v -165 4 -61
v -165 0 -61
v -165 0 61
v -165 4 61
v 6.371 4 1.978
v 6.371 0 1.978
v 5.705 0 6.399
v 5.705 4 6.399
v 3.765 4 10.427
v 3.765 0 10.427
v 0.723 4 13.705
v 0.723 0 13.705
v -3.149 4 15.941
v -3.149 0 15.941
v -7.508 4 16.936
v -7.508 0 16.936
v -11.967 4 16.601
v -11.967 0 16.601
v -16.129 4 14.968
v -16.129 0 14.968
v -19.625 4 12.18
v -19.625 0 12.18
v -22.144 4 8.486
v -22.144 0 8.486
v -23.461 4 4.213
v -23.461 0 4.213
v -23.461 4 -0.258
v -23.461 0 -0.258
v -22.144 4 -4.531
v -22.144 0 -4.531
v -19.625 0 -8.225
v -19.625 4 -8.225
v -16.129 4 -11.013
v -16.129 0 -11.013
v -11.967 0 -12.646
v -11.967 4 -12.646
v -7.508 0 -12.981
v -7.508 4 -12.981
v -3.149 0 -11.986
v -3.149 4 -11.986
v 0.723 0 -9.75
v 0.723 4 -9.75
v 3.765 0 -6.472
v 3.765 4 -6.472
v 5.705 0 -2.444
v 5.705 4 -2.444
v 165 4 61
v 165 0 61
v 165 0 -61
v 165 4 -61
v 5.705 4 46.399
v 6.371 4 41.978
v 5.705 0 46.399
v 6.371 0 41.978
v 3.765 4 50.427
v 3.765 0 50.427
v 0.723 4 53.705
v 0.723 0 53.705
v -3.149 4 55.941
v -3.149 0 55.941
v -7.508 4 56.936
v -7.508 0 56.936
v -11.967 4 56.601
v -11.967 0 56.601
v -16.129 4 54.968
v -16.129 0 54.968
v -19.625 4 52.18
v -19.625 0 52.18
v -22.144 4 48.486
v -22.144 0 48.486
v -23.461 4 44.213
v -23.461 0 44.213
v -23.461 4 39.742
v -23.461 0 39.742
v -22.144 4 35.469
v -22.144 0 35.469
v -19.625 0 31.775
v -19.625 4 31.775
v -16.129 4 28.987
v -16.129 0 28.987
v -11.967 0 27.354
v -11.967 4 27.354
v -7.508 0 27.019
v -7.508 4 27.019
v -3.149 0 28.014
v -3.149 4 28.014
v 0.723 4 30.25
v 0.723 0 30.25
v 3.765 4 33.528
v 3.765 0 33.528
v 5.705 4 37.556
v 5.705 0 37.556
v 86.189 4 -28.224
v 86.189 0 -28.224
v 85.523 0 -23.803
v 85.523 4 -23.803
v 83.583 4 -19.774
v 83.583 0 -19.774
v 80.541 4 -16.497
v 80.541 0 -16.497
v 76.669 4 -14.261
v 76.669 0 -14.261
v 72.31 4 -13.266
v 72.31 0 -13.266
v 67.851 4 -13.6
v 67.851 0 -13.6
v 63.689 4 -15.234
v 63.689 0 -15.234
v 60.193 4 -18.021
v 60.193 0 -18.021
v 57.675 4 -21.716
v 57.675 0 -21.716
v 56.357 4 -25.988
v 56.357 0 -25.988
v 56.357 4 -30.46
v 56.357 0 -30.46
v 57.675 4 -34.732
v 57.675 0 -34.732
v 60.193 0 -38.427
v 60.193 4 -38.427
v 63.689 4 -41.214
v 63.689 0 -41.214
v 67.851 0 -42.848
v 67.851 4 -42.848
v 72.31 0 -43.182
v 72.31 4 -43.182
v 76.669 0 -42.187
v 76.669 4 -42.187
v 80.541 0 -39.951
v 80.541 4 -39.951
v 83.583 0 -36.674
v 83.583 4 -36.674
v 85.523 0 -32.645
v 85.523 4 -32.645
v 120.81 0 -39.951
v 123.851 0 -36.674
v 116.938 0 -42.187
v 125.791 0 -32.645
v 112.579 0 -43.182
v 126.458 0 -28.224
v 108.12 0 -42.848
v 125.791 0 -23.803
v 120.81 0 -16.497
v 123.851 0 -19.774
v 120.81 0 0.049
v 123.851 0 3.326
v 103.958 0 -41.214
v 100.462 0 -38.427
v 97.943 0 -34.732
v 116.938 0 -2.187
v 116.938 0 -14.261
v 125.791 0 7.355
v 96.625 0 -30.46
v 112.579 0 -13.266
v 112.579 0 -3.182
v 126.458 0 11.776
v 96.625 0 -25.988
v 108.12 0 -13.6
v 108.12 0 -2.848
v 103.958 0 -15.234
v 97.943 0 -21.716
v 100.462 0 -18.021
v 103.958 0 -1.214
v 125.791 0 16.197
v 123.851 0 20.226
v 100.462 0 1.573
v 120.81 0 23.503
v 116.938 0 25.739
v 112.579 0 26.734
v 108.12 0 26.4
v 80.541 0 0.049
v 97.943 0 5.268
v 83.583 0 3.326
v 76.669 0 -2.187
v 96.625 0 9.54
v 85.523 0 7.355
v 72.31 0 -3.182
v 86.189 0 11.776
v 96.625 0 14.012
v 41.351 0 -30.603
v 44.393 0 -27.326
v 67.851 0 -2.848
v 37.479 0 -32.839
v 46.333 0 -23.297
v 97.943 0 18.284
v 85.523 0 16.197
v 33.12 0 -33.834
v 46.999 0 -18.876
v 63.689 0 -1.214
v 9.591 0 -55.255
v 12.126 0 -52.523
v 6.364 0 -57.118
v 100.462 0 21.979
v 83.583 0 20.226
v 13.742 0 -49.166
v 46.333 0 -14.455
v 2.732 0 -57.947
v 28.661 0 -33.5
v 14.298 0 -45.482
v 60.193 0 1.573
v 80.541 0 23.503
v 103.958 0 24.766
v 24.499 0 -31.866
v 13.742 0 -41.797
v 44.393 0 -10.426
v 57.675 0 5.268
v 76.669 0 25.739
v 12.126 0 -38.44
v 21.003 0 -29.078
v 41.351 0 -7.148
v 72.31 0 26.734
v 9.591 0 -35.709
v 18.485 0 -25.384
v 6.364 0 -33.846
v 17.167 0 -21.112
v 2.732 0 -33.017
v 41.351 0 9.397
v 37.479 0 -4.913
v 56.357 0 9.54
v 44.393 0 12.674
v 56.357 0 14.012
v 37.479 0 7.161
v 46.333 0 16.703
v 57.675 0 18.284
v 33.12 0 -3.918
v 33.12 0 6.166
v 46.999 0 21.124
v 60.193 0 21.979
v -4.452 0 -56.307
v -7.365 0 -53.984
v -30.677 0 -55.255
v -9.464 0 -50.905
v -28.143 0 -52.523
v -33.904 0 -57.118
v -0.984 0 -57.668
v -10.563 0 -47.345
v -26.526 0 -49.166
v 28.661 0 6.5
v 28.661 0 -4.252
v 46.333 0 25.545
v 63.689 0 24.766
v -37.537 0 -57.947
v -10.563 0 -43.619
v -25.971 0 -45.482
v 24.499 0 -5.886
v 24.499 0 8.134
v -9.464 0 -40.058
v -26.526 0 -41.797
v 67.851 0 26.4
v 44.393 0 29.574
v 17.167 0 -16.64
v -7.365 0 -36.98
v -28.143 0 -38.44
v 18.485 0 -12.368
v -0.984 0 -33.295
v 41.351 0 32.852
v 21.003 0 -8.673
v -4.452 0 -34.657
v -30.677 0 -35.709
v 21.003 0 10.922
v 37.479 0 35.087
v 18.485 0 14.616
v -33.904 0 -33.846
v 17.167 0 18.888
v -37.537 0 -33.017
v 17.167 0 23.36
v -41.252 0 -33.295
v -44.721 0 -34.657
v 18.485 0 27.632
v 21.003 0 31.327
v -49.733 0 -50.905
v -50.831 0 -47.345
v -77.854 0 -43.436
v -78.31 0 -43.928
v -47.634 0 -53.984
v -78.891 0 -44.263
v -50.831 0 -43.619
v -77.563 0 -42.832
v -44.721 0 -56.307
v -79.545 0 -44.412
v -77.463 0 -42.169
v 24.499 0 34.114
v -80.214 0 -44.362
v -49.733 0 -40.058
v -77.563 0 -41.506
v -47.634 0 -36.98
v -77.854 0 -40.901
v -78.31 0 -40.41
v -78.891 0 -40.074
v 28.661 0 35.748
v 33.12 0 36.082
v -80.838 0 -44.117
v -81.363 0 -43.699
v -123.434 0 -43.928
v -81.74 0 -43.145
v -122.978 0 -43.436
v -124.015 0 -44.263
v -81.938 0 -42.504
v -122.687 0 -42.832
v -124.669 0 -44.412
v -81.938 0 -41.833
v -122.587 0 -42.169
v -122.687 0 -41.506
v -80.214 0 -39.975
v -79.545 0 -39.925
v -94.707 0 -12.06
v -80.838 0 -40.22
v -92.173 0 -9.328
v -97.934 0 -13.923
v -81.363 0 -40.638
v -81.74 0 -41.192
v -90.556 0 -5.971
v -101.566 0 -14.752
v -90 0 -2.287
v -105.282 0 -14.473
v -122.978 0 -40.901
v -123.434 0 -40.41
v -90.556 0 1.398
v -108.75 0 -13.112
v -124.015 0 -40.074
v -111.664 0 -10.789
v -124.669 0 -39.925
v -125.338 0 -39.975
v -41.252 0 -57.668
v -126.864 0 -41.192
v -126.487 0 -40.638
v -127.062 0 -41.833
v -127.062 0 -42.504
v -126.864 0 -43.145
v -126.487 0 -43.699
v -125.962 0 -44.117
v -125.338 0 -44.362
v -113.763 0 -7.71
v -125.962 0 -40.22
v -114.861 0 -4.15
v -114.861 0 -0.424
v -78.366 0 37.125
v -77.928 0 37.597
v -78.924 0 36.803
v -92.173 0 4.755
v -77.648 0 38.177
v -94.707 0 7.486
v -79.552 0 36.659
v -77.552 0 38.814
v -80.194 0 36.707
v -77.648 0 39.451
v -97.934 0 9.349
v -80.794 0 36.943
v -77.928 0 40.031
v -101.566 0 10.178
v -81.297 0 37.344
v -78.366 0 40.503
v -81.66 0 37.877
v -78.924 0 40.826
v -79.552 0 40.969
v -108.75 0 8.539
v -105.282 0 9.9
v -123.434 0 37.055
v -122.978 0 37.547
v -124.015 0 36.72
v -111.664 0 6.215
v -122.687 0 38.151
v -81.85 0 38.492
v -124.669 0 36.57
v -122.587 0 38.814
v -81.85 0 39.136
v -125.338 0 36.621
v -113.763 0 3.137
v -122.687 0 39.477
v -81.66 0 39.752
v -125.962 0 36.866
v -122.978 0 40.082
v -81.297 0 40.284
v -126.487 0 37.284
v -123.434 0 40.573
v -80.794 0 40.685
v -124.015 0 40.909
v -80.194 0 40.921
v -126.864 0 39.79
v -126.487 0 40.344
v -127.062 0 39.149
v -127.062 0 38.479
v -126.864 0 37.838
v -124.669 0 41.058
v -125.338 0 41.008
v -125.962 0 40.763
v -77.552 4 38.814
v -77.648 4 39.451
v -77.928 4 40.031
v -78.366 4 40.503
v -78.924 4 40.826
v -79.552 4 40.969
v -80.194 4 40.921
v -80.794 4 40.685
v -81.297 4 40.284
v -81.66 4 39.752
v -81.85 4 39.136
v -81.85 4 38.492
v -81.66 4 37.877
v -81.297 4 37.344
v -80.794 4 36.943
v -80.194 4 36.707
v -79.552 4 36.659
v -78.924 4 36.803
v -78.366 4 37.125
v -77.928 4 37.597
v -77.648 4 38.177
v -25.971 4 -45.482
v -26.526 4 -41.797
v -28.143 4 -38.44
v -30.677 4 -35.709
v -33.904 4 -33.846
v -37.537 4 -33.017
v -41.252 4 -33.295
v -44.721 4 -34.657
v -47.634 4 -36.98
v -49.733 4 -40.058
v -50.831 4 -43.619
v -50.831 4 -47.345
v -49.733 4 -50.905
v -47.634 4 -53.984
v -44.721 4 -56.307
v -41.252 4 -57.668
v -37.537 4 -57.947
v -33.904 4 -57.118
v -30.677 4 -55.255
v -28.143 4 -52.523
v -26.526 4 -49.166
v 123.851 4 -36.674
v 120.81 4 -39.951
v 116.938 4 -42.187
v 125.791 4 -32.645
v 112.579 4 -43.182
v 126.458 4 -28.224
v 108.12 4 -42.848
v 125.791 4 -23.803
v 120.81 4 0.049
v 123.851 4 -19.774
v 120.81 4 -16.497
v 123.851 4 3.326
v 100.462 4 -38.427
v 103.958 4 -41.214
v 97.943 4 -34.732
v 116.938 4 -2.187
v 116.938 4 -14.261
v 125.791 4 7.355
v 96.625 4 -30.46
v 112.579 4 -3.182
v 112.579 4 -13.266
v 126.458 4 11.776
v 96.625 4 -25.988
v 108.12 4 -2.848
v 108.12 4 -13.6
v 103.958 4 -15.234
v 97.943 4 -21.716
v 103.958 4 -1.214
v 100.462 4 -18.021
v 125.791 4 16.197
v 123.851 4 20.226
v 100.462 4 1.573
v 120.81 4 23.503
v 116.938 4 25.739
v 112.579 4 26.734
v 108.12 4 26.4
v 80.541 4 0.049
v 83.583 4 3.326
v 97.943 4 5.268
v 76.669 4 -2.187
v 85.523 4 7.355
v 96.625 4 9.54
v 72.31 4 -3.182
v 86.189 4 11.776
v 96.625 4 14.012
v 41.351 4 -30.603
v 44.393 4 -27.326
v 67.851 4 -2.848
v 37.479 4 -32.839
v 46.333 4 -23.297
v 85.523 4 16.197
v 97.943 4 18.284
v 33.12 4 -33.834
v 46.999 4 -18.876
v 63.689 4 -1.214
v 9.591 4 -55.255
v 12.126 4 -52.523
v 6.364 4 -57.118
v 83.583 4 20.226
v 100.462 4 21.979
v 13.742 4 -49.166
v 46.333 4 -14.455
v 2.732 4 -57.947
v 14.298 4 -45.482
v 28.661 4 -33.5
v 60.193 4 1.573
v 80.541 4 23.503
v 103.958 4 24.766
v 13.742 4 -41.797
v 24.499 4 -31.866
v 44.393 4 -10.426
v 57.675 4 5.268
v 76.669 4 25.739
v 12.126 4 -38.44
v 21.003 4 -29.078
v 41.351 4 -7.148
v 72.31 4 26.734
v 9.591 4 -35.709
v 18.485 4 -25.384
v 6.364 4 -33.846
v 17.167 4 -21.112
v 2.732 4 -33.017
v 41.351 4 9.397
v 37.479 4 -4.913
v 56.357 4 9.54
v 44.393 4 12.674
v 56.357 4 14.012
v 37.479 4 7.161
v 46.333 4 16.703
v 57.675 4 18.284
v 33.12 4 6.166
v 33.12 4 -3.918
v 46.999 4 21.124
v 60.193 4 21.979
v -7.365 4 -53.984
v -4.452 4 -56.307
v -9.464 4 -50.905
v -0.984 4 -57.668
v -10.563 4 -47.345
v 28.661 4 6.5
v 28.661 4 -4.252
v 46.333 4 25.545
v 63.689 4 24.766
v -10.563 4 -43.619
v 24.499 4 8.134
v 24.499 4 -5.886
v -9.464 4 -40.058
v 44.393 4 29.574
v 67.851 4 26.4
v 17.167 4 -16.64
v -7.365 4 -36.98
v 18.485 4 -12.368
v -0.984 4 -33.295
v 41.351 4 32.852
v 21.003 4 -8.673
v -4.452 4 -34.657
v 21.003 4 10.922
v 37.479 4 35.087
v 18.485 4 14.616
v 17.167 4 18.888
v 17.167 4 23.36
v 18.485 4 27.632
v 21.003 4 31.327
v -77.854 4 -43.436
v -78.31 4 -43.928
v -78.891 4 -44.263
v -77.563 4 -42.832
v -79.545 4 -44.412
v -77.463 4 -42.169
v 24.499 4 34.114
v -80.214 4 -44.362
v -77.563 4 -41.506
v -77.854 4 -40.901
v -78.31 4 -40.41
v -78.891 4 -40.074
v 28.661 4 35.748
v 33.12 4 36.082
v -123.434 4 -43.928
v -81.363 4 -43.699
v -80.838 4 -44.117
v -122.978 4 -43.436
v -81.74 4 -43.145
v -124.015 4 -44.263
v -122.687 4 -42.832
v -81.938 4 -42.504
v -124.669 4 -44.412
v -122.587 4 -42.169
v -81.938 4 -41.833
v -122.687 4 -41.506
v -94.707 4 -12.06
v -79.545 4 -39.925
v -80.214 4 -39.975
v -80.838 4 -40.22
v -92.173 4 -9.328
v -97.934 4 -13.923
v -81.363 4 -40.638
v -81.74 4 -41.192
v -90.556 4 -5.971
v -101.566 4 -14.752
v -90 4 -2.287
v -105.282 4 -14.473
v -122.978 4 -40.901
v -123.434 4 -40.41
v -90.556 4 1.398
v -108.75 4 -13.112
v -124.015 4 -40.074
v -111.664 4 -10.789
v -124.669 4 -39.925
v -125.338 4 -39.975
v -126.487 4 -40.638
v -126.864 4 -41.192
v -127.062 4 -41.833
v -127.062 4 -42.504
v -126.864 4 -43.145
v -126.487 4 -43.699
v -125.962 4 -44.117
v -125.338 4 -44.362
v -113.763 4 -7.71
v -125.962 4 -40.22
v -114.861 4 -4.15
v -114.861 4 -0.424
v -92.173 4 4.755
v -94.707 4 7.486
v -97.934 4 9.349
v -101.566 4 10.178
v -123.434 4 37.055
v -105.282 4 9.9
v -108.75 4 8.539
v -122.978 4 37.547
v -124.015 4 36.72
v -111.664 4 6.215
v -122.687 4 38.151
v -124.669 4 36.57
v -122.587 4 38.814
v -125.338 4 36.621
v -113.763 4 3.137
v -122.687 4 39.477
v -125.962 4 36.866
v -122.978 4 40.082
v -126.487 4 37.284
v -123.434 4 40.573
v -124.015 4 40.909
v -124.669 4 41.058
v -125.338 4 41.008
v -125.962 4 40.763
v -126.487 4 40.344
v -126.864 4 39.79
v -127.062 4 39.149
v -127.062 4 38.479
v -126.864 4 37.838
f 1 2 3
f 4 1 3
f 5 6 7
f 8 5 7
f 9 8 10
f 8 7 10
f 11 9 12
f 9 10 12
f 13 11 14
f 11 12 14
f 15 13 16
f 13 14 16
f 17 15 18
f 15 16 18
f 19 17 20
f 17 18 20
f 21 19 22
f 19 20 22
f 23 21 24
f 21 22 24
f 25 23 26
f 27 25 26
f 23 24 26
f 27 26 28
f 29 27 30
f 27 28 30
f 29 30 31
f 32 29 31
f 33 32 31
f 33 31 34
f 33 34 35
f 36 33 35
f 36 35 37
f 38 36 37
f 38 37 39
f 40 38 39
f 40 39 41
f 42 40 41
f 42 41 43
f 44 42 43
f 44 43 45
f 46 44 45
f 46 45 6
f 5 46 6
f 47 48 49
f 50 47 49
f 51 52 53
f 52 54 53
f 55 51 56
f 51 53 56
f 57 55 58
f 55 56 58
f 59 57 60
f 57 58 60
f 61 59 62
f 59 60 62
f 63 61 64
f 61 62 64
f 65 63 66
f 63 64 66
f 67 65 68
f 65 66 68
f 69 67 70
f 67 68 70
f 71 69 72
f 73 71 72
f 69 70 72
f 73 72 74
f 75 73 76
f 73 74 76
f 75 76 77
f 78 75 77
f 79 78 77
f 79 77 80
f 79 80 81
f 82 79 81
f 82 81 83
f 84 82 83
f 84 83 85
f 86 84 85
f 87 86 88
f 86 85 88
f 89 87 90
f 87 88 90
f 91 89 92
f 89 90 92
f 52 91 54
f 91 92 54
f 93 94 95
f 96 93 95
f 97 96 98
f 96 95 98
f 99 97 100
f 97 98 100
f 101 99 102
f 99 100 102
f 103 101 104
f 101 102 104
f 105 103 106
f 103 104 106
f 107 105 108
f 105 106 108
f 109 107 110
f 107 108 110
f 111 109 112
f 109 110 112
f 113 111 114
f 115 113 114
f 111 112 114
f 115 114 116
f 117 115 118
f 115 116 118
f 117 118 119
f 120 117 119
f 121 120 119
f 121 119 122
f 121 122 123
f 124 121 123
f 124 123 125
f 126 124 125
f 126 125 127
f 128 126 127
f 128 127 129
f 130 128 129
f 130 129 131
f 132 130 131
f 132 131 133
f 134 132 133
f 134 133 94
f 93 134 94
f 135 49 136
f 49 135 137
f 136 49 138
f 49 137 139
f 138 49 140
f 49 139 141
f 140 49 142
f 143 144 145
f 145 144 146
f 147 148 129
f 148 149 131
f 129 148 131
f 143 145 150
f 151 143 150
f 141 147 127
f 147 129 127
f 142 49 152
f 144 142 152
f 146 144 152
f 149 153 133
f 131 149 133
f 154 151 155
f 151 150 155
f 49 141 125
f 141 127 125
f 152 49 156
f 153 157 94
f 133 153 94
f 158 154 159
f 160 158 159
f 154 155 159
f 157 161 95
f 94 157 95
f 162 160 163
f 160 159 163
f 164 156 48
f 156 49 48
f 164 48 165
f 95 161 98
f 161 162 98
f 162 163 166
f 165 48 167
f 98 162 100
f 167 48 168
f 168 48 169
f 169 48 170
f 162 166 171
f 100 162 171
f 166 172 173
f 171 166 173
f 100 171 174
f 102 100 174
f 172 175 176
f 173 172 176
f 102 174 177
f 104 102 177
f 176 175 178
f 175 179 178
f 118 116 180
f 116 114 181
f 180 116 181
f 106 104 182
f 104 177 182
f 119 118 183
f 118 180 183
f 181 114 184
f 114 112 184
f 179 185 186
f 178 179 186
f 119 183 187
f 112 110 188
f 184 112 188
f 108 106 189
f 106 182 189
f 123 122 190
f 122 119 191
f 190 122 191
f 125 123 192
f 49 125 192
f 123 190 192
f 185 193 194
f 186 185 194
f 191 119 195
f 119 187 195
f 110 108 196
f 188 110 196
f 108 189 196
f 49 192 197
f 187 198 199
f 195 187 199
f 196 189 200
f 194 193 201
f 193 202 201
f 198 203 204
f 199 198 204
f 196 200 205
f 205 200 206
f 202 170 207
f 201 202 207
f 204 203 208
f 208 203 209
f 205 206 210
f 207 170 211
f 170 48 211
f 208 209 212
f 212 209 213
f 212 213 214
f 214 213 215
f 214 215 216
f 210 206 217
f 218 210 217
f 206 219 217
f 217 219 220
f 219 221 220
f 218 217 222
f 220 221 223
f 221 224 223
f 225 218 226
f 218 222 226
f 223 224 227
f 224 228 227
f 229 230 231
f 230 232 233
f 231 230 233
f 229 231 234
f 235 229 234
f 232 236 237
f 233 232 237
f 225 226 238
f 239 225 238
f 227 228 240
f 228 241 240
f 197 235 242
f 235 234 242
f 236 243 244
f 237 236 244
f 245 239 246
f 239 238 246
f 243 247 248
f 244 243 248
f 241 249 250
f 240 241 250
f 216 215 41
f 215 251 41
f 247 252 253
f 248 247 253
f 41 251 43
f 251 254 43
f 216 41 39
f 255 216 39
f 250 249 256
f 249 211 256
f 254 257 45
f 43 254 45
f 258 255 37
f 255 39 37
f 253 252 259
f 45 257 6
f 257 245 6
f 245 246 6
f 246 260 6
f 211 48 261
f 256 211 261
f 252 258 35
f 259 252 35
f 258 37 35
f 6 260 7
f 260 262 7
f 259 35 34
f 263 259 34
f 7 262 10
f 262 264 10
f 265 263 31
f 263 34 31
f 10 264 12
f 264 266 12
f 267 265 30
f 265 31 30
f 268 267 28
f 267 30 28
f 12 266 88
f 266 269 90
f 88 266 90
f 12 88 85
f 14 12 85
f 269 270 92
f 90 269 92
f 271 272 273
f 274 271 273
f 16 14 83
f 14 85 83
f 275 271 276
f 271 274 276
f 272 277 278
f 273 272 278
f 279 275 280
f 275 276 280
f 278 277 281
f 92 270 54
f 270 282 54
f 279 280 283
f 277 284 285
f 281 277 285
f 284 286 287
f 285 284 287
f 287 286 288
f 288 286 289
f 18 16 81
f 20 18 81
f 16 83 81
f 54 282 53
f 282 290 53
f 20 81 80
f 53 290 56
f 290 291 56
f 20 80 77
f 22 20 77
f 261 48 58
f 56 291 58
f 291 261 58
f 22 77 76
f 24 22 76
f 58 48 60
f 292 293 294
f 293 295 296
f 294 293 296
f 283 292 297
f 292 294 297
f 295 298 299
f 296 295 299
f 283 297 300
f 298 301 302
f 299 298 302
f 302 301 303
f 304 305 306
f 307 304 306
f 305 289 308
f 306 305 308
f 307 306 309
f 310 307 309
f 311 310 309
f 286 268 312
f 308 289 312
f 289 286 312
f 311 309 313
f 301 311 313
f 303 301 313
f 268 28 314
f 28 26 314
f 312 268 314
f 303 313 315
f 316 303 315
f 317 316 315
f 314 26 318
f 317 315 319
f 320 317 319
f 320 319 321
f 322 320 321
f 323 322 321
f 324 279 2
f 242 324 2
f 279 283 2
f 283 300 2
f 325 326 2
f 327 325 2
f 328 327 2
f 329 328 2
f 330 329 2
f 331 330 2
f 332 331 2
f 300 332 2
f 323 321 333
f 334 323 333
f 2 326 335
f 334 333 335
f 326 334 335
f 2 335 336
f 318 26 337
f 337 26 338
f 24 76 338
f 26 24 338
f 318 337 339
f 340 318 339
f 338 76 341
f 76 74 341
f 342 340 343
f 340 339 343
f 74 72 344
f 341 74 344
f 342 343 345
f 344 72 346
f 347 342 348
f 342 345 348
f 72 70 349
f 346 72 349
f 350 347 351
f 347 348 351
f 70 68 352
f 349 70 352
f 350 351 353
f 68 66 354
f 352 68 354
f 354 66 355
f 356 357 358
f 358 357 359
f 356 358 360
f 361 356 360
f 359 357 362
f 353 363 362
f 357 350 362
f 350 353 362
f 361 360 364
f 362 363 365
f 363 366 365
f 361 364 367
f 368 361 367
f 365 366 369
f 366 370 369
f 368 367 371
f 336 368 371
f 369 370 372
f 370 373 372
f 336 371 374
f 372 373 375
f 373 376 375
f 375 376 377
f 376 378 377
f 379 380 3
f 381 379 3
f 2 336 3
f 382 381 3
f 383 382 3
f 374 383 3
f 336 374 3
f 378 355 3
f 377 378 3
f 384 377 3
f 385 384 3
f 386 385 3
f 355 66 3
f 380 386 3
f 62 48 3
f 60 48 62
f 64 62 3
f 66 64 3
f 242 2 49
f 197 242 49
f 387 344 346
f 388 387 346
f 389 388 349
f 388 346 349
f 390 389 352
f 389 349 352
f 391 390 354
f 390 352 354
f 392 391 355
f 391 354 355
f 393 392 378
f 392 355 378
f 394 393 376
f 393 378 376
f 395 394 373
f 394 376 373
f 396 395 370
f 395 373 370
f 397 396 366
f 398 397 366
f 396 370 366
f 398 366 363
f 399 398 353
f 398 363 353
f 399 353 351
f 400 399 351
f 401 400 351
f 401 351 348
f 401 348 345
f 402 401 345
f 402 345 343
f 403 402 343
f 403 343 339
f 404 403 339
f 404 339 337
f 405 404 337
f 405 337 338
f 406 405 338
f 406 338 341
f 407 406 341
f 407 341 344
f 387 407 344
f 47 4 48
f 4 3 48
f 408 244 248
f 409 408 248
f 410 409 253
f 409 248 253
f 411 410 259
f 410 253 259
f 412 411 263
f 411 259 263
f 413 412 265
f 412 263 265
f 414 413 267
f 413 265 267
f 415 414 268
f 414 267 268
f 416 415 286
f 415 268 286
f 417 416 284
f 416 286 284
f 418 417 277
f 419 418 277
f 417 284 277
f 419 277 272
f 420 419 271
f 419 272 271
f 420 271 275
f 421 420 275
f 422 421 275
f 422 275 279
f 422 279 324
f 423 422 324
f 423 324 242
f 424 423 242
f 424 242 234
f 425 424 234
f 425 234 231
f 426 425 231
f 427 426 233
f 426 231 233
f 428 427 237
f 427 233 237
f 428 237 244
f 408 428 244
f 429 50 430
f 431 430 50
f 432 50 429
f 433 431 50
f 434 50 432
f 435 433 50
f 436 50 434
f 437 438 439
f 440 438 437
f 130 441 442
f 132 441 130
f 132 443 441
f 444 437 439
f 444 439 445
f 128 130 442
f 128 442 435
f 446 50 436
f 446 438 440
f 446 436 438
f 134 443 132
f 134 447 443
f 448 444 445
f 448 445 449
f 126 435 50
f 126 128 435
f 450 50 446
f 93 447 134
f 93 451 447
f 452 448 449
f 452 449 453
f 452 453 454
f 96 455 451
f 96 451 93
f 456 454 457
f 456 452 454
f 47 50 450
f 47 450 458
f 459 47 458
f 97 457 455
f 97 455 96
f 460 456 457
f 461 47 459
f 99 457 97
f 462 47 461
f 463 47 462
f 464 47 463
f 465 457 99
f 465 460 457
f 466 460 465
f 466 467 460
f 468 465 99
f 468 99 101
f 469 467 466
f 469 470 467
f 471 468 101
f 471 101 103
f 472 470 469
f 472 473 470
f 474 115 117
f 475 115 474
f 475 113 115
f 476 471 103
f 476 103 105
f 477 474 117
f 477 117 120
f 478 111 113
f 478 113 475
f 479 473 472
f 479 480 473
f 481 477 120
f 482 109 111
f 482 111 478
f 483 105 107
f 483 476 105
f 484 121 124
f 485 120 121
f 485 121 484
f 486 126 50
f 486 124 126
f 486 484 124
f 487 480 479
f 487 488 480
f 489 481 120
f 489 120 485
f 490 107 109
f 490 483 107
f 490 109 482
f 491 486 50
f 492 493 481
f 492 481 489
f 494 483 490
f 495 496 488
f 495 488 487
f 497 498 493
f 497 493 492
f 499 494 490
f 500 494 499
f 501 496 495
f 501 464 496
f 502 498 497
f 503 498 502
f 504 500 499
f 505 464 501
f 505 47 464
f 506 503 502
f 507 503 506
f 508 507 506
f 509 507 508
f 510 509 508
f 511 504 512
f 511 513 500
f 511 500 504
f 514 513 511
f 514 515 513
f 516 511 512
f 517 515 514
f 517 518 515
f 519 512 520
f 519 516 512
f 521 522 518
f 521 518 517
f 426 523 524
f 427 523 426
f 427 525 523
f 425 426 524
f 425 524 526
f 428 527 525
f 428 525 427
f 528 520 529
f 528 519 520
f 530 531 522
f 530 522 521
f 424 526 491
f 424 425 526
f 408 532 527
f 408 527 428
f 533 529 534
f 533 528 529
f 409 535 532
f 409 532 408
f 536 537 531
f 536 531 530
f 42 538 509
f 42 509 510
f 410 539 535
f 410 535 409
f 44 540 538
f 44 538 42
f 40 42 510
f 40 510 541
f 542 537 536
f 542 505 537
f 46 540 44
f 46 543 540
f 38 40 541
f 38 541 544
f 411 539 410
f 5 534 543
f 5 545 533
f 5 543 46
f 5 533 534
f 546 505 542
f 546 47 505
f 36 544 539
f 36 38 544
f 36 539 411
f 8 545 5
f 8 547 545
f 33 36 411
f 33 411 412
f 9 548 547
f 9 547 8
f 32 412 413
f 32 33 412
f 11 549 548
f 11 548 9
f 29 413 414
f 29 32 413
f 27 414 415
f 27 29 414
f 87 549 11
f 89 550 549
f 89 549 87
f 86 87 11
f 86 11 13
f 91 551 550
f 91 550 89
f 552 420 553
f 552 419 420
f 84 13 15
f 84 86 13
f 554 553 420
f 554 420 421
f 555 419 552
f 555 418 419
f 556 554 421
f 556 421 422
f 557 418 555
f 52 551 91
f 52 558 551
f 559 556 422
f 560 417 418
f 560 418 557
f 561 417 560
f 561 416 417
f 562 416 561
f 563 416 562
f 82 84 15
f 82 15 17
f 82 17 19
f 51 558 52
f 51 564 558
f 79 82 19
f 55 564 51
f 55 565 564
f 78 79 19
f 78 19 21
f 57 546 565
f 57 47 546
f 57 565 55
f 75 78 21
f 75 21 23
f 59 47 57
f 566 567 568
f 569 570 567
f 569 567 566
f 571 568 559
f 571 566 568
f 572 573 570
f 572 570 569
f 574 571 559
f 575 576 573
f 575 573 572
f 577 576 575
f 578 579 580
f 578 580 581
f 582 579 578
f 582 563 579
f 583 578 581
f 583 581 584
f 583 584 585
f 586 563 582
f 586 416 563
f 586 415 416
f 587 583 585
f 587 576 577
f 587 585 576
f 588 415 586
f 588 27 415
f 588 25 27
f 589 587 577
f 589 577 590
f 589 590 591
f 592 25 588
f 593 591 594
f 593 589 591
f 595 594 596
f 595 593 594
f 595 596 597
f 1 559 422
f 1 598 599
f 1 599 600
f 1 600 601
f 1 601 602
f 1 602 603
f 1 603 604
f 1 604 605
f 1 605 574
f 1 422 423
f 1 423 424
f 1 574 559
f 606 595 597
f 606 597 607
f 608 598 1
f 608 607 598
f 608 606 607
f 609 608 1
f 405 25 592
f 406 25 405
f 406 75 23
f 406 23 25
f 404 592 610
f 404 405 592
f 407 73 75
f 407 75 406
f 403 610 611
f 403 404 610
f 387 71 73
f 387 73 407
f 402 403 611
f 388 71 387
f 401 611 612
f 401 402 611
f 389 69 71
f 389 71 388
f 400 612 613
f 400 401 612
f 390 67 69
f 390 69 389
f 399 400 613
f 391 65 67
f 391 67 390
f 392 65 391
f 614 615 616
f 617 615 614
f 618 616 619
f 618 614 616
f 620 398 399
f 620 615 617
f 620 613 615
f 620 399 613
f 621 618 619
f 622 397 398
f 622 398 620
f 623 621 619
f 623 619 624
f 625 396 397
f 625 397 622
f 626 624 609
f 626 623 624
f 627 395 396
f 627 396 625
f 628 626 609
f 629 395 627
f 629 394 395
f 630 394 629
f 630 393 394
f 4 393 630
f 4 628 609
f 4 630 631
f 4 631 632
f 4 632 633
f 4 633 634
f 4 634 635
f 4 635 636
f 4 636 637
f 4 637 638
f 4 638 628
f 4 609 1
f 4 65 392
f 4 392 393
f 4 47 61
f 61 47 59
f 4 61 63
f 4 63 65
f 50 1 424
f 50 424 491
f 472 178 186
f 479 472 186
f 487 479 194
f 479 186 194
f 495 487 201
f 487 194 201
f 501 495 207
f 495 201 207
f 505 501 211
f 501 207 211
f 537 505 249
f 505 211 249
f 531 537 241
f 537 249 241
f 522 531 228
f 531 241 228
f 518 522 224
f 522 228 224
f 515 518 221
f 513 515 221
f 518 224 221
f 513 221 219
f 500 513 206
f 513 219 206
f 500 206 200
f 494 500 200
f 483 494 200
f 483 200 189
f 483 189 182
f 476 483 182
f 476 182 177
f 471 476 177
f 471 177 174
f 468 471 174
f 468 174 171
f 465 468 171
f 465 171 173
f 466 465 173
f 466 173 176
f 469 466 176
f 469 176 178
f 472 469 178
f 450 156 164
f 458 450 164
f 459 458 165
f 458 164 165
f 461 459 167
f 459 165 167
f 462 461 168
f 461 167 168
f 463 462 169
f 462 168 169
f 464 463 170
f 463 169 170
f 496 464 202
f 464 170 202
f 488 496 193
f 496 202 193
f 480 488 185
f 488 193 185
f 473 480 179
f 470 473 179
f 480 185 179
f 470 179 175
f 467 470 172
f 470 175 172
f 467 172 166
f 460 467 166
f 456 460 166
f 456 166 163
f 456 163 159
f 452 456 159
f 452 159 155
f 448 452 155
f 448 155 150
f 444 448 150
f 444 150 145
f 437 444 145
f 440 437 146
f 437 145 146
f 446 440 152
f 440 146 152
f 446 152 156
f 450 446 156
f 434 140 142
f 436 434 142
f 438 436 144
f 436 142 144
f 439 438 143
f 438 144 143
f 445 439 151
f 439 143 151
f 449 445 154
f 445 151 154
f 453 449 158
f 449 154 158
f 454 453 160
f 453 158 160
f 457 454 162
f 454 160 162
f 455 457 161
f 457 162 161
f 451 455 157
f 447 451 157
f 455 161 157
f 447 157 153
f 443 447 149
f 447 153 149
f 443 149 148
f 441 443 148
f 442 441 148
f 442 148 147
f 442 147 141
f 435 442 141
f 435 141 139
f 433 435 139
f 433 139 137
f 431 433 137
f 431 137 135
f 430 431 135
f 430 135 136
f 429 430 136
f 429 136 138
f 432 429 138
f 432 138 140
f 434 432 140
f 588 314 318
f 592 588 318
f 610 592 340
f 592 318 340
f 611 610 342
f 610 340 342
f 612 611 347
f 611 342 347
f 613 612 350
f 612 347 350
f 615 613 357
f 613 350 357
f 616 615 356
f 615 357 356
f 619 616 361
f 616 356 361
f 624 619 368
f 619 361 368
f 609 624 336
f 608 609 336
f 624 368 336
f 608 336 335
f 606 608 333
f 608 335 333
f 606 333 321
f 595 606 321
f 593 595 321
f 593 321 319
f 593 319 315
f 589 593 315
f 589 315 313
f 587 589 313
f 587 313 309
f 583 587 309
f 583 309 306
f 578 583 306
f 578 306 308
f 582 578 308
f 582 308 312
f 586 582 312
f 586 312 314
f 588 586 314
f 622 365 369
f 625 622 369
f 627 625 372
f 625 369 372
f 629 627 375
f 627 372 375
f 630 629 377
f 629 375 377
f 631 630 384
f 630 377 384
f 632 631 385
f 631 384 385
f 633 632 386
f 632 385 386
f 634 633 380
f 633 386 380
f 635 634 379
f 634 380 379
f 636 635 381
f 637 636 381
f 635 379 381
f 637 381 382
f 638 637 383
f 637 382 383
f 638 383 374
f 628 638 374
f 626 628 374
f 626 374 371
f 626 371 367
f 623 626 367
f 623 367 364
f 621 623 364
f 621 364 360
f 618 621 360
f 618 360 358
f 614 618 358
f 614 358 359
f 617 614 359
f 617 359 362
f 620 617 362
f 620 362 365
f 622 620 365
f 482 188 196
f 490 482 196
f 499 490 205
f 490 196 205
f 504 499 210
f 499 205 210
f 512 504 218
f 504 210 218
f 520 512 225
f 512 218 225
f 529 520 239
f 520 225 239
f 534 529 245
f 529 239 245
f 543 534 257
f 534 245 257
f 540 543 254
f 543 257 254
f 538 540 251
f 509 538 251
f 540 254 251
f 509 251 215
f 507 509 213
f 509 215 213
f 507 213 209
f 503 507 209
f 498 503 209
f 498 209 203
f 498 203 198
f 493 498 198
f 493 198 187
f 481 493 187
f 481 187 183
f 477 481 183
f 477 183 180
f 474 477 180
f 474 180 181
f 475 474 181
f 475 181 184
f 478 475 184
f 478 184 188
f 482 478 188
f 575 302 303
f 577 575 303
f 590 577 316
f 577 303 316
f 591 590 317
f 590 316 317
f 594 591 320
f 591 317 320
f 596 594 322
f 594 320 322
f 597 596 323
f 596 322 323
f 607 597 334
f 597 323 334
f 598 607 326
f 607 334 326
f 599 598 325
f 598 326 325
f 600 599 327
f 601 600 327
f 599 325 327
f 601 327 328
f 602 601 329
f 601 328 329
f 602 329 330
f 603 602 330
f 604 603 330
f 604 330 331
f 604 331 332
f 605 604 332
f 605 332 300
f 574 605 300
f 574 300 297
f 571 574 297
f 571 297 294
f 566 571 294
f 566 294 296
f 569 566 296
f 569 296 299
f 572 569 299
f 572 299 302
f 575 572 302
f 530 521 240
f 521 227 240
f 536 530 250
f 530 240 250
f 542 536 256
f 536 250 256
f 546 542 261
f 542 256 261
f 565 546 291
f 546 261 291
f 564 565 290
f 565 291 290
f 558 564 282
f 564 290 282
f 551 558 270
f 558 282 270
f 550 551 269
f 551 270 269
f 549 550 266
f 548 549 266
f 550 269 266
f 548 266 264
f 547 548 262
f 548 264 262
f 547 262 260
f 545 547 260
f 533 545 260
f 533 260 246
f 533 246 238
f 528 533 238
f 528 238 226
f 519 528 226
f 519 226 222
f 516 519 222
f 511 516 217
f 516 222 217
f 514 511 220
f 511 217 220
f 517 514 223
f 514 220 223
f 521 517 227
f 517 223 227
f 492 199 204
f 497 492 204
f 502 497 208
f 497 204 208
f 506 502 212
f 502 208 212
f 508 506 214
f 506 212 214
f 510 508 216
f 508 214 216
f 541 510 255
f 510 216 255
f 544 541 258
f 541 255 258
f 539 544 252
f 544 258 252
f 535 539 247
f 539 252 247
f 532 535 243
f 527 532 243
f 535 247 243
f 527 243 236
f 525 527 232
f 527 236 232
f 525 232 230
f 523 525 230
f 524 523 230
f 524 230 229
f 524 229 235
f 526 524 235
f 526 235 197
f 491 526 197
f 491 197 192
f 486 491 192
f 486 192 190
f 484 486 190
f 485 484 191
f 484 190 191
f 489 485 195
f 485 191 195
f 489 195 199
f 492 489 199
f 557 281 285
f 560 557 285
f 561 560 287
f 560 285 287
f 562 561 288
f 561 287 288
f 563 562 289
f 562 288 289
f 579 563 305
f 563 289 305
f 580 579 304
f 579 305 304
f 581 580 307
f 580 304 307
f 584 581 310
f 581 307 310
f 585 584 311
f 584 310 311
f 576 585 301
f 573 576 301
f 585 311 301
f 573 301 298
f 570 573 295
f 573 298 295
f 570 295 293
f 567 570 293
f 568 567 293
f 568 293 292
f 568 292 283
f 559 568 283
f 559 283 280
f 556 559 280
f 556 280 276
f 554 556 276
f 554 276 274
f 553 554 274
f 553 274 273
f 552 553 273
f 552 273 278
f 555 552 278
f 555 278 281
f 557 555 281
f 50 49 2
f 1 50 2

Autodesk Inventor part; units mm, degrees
ref_plane "YZ Plane" through (0, 0, 0) normal (1, 0, 0) x (0, 1, 0)
ref_plane "XZ Plane" through (0, 0, 0) normal (0, 1, 0) x (-1, 0, 0)
ref_plane "XY Plane" through (0, 0, 0) normal (0, 0, 1) x (1, 0, 0)
sketch "Sketch1" plane through (0, 0, 0) normal (0, 1, 0) x (-1, 0, 0)
  line L0 (165, 61) -> (-165, 61)
  line L1 (-165, 61) -> (-165, -61)
  line L2 (-165, -61) -> (165, -61)
  line L3 (165, -61) -> (165, 61)
  point P0 (0, 0)
  point P1 (0, -61)
  point P2 (165, 0)
  dimension "d0" = 122
  dimension "d1" = 330
extrude "Extrusion1" add sketch "Sketch1" along normal blind 4
sketch "Esboço2" plane through (0, 0, 0) normal (0, -1, 0) x (1, 0, 0)
  circle A0 centre (111.4577, -28.224) radius 15
  circle A1 centre (71.1891, -28.224) radius 15
  circle A2 centre (71.1891, 11.776) radius 15
  circle A3 centre (111.4577, 11.776) radius 15
  circle A4 centre (31.9991, -18.8759) radius 15
  circle A5 centre (31.9991, 21.1241) radius 15
  circle A6 centre (-8.629, 1.9775) radius 15
  circle A7 centre (-8.629, 41.9775) radius 15
  circle A8 centre (1.7977, -45.4819) radius 12.5
  circle A9 centre (-38.4709, -45.4819) radius 12.5
  circle A10 centre (-102.5005, -2.2868) radius 12.5
  circle A11 centre (-79.7133, -42.1687) radius 2.25
  circle A12 centre (-124.8372, -42.1687) radius 2.25
  circle A13 centre (-79.7133, 38.8141) radius 2.1608
  circle A14 centre (-124.8372, 38.8141) radius 2.25
  point P0 (0, 0)
  dimension "d4" = 30
  dimension "d5" = 30
  dimension "d6" = 30
  dimension "d7" = 30
  dimension "d8" = 30
  dimension "d9" = 30
  dimension "d10" = 40
  dimension "d11" = 40
  dimension "d12" = 40
  dimension "d13" = 30
  dimension "d14" = 30
  dimension "d15" = 40
  dimension "d16" = 25
  dimension "d17" = 25
  dimension "d18" = 25
  dimension "d19" = 4.5
  dimension "d20" = 4.5
  dimension "d21" = 4.5
extrude "Extrusão2" cut sketch "Esboço2" against normal blind 5
sketch "Esboço3" plane through (0, 0, 0) normal (0, -1, 0) x (1, 0, 0)
  point P0 (0, 0)
properties part number "controles2"
